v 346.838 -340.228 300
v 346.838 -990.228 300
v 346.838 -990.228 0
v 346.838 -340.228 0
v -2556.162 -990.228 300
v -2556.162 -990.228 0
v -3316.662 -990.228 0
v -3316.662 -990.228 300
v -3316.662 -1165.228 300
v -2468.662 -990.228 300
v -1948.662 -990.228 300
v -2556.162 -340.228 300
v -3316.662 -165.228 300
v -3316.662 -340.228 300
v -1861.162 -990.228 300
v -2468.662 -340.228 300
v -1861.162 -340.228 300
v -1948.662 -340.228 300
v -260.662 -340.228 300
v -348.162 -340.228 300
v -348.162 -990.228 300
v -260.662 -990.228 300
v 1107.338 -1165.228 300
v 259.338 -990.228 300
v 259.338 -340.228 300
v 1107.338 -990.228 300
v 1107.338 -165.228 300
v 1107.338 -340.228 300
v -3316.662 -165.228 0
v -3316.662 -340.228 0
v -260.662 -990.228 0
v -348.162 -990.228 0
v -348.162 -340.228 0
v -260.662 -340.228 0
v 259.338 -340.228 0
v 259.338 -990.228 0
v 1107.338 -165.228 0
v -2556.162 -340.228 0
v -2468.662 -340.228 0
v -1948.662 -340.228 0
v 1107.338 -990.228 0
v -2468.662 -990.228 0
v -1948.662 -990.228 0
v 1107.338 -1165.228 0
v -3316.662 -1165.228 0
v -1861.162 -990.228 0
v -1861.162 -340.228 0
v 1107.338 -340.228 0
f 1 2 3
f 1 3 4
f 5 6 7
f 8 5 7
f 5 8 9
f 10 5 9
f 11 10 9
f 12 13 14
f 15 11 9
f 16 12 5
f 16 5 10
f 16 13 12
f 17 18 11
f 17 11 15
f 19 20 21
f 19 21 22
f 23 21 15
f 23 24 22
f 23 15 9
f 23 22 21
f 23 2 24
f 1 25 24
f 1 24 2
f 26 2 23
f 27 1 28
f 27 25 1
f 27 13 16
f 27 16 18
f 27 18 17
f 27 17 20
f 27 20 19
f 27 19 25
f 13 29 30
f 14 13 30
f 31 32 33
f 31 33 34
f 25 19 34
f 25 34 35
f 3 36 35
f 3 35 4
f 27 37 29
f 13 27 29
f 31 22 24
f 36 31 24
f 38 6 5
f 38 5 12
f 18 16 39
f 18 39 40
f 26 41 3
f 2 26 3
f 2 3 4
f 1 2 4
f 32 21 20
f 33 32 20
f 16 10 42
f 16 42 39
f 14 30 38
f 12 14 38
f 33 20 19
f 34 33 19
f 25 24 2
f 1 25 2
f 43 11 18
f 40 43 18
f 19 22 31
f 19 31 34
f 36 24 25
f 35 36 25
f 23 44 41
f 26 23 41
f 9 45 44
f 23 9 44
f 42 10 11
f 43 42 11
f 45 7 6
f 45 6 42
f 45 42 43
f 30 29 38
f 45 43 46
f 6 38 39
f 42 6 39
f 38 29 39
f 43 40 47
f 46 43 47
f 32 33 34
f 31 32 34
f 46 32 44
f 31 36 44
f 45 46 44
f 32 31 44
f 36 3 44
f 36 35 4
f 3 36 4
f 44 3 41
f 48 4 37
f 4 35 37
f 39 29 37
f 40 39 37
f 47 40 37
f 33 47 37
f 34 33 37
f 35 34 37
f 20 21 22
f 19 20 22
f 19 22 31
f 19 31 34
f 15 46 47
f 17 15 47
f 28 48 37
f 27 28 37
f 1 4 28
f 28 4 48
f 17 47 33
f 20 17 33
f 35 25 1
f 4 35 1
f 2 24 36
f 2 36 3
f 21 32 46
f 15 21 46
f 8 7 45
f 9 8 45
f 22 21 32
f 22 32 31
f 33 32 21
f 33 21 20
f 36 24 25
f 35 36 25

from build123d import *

# Parameters (mm, degrees)
F0_W     = 695
F0_H     = 650
F1_DEPTH = 300
F2_W     = 520
F2_H     = 650
F2_W_2   = 175
F3_DEPTH = 300.001
F4_W     = 695
F4_H     = 650
F5_DEPTH = 300
F6_W     = 520
F6_H     = 650
F7_DEPTH = 300.001
F8_W     = 520
F8_H     = 650
F9_DEPTH = 300.001


with BuildPart() as f1:
    # F0 (on Top) → F1 (new body)
    with BuildSketch(Plane.XY):
        Polygon((-2556.1617680192, -990.2275687945), (-3316.6617680192, -990.2275687945), (-3316.6617680192, -1165.2275687945), (1107.3382319808, -1165.2275687945), (1107.3382319808, -990.2275687945), (346.8382319808, -990.2275687945), (-348.1617680192, -990.2275687945), (-1861.1617680192, -990.2275687945), align=None)
        with Locations((-2208.6617680192, -665.2275687945)):
            Rectangle(F0_W, F0_H)
        Polygon((-3316.6617680192, -340.2275687945), (-2556.1617680192, -340.2275687945), (-1861.1617680192, -340.2275687945), (-348.1617680192, -340.2275687945), (346.8382319808, -340.2275687945), (1107.3382319808, -340.2275687945), (1107.3382319808, -165.2275687945), (-3316.6617680192, -165.2275687945), align=None)
        with Locations((-0.6617680192, -665.2275687945)):
            Rectangle(F0_W, F0_H)
    extrude(amount=F1_DEPTH)

    # F2 (on face) → F3 (cut, through all)
    with BuildSketch(Plane.XY.offset(300)):
        with Locations((-2208.6617680192, -665.2275687945)):
            Rectangle(F2_W, F2_H)
        with Locations((-3316.6617680192, -665.2275687945)):
            Rectangle(F2_W_2, F2_H)
    extrude(amount=-F3_DEPTH, mode=Mode.SUBTRACT)


with BuildPart() as f5:
    # F4 (on face) → F5 (new body)
    with BuildSketch(Plane.XY.offset(300)):
        with Locations((-0.6617680192, -665.2275687945)):
            Rectangle(F4_W, F4_H)
    extrude(amount=-F5_DEPTH)


with BuildPart() as f7_tool:
    # F6 (on face) → F7 (new body, through all)
    with BuildSketch(Plane.XY.offset(300)):
        with Locations((-0.6617680192, -665.2275687945)):
            Rectangle(F6_W, F6_H)
    extrude(amount=-F7_DEPTH)


with BuildPart() as f1_1:
    add(f1.part)

    # F7: cut by f7_tool
    add(f7_tool.part, mode=Mode.SUBTRACT)

    # F8 (on face) → F9 (cut, through all)
    with BuildSketch(Plane.XY.offset(300)):
        with Locations((-0.6617680192, -665.2275687945)):
            Rectangle(F8_W, F8_H)
    extrude(amount=-F9_DEPTH, mode=Mode.SUBTRACT)


with BuildPart() as f5_1:
    add(f5.part)

    # F7: cut by f7_tool
    add(f7_tool.part, mode=Mode.SUBTRACT)


solid = Compound([f1_1.part, f5_1.part])
